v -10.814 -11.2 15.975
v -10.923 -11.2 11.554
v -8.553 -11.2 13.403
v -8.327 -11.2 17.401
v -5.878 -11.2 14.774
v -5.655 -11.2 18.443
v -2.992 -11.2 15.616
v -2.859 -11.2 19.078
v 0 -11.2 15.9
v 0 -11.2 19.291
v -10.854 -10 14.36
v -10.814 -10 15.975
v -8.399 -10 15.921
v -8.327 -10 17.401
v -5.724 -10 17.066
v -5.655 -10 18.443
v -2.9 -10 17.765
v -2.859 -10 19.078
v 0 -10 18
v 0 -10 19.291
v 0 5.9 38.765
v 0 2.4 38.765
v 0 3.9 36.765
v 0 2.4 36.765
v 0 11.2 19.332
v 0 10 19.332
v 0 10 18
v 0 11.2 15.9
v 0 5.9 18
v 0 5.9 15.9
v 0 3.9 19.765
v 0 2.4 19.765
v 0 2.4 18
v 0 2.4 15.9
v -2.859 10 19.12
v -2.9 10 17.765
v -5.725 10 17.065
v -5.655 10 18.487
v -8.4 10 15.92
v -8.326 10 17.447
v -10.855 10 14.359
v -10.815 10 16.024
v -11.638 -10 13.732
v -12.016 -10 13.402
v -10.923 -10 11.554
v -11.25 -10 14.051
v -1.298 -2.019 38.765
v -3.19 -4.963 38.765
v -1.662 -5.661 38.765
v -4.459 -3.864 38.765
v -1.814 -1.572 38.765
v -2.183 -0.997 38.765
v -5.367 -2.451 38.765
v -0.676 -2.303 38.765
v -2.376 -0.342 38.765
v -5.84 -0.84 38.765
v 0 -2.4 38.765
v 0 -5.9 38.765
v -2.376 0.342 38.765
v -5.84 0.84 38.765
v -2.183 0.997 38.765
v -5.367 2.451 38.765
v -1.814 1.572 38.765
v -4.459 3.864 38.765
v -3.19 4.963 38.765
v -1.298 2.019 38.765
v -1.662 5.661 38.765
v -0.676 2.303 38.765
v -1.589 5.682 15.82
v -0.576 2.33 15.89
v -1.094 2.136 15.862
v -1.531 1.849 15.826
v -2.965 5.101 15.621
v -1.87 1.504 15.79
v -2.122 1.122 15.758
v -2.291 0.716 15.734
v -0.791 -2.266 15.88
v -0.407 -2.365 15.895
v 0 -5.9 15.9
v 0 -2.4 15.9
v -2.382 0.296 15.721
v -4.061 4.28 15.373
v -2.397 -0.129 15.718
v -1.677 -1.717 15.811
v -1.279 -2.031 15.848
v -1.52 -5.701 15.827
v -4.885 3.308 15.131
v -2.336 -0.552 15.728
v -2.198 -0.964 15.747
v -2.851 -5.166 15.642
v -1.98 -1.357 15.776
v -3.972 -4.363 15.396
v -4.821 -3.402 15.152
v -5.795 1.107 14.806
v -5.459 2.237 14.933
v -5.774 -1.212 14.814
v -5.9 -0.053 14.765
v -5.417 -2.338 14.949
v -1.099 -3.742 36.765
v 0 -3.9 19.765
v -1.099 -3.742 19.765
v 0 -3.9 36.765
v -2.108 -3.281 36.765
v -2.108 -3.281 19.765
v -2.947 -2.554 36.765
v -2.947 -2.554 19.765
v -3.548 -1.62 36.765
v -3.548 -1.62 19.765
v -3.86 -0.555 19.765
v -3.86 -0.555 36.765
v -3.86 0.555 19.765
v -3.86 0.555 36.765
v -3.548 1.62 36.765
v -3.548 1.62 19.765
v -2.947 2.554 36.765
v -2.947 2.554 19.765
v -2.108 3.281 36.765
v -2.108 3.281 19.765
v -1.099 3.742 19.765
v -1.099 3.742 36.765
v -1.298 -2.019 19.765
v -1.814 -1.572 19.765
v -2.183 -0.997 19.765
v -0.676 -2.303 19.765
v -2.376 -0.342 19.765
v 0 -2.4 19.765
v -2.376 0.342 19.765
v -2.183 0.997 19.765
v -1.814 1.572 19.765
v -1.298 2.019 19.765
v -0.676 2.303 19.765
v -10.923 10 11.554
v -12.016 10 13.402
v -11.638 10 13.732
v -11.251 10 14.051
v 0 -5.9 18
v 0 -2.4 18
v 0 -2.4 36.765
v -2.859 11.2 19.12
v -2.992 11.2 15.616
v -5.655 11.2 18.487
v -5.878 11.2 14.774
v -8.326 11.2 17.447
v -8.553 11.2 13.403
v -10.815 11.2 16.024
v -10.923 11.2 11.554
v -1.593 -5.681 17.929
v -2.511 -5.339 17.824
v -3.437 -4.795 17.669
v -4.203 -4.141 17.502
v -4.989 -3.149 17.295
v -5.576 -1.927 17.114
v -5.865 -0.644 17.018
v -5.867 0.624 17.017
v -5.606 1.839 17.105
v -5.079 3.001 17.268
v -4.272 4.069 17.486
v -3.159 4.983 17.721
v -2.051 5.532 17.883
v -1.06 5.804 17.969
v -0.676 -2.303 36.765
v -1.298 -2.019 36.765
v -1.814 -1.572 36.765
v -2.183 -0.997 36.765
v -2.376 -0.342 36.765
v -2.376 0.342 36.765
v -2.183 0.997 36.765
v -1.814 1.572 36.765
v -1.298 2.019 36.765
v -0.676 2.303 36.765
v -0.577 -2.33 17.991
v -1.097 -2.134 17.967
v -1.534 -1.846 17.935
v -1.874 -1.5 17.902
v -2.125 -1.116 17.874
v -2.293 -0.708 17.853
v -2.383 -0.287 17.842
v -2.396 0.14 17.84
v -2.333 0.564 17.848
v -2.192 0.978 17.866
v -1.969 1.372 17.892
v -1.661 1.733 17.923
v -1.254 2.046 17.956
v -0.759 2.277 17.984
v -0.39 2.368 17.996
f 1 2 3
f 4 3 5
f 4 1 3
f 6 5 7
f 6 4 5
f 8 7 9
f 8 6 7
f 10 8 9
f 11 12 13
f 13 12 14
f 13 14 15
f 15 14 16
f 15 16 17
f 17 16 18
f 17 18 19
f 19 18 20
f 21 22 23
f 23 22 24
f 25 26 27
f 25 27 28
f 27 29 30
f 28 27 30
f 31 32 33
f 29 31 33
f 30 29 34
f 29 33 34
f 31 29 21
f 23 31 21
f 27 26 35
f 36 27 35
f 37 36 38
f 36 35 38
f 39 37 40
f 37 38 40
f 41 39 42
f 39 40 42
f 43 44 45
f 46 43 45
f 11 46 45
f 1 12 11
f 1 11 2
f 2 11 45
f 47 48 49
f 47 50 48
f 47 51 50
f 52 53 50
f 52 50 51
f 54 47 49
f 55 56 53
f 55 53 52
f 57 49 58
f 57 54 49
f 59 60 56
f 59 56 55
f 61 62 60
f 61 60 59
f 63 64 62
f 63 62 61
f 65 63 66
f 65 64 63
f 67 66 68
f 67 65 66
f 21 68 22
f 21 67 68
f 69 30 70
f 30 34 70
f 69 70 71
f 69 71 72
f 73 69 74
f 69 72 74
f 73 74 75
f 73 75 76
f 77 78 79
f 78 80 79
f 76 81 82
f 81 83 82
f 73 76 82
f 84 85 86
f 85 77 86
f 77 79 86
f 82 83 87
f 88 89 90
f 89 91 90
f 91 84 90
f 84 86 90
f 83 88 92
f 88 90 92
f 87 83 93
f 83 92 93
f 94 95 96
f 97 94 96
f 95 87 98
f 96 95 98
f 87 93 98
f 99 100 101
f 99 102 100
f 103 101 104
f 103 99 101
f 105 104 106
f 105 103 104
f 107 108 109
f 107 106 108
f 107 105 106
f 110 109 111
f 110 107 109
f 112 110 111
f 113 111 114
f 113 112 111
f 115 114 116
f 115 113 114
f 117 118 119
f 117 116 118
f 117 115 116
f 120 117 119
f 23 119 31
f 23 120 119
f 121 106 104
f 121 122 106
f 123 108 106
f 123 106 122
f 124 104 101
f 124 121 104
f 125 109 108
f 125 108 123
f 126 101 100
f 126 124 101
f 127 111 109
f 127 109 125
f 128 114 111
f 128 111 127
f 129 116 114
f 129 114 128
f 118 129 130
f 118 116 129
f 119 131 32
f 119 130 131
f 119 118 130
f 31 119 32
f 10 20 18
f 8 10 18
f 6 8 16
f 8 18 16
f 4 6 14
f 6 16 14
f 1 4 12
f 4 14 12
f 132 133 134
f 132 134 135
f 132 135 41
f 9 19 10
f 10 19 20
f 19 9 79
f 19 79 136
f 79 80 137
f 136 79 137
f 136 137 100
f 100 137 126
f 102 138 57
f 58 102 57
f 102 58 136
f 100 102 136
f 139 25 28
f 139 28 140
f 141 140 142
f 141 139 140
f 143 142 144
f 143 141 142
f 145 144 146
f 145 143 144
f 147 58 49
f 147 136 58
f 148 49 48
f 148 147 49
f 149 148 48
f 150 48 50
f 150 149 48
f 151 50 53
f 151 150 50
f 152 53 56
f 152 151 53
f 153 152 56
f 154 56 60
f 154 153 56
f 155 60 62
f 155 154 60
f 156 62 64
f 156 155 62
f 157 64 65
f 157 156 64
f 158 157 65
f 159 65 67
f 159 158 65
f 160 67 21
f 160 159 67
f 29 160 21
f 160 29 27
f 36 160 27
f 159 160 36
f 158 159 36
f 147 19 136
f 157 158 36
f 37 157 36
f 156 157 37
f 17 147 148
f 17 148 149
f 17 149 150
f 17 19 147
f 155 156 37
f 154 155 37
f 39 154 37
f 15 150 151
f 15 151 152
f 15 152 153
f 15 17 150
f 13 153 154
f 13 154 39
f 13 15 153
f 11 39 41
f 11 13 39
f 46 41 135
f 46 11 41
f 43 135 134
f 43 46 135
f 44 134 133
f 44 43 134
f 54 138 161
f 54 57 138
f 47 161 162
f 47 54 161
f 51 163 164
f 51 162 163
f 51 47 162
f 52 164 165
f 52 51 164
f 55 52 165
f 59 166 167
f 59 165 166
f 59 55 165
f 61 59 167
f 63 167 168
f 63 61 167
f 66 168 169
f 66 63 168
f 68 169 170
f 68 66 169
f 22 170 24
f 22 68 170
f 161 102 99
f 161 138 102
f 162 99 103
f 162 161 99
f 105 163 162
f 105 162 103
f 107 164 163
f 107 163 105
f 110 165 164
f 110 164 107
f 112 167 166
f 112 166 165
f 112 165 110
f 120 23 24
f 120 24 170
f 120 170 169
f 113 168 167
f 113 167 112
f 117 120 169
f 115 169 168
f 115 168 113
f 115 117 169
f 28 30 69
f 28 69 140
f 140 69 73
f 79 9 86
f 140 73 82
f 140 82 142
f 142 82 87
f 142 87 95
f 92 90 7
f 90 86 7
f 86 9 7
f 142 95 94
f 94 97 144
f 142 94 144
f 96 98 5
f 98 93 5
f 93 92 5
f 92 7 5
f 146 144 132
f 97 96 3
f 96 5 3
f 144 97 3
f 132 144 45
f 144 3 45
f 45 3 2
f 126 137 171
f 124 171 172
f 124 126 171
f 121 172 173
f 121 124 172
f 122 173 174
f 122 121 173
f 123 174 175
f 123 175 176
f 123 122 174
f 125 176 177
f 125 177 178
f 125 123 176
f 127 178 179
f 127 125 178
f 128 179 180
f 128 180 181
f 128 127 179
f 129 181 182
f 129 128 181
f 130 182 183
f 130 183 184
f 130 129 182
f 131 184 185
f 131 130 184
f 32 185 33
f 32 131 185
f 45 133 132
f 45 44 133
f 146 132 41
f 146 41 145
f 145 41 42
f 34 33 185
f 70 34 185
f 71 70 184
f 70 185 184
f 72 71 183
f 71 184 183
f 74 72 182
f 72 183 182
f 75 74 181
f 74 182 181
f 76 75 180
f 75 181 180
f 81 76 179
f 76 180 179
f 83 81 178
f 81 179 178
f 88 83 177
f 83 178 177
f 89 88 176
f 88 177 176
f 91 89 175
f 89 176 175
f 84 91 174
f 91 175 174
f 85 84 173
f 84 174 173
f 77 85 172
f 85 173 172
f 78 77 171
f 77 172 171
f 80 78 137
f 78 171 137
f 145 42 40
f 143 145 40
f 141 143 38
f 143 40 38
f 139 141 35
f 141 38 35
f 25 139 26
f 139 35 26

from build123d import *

# Parameters (mm, degrees)
F1_ANGLE  = 180
F3_DEPTH  = 10
F4_R      = 15.9
F5_DEPTH  = 12.5
F6_R      = 2.4
F7_DEPTH  = 8.211553
F9_DEPTH  = 1.2
F11_DEPTH = 1.2


with BuildPart() as f1:
    # F0 (on Front) → F1 (revolve, symmetric)
    with BuildSketch(Plane.XZ) as f1_sk:
        Polygon((-5.9, 14.764823), (-2.4, 15.717824), (-2.4, 19.764823), (-3.9, 19.764823), (-3.9, 36.764823), (-2.4, 36.764823), (-2.4, 38.764823), (-5.9, 38.764823), align=None)
    revolve(axis=Axis((0, 0, 26.233703), (0, 0, 1)), revolution_arc=F1_ANGLE / 2)
    revolve(f1_sk.sketch, axis=Axis((0, 0, 26.233703), (0, 0, -1)), revolution_arc=F1_ANGLE / 2)

    # F2 (on Front) → F3 (join, symmetric)
    with BuildSketch(Plane.XZ):
        with BuildLine():
            ThreePointArc((-10.922859, 11.55427), (-5.877802, 14.773674), (0, 15.9))
            Line((0, 15.9), (0, 18))
            ThreePointArc((0, 18), (-6.432893, 16.811243), (-12.016103, 13.401987))
            Line((-12.016103, 13.401987), (-10.922859, 11.55427))
        make_face()
    extrude(amount=F3_DEPTH, both=True)

    # F4 (on Front) → F5 (cut, symmetric)
    with BuildSketch(Plane.XZ):
        Circle(F4_R)
    extrude(amount=F5_DEPTH, both=True, mode=Mode.SUBTRACT)

    # F6 (on face) → F7 (cut, through all)
    with BuildSketch(Plane.XY.offset(19.764823)):
        Circle(F6_R)
    extrude(amount=-F7_DEPTH, mode=Mode.SUBTRACT)

    # F8 (on face) → F9 (join)
    with BuildSketch(Plane.XZ.offset(10)):
        with BuildLine():
            ThreePointArc((-10.922859, 11.55427), (-5.877802, 14.773674), (0, 15.9))
            Line((0, 15.9), (0, 19.290676))
            ThreePointArc((0, 19.290676), (-5.655412, 18.443061), (-10.813836, 15.974703))
            Line((-10.813836, 15.974703), (-10.922859, 11.55427))
        make_face()
    extrude(amount=F9_DEPTH)

    # F10 (on face) → F11 (join)
    with BuildSketch(Plane(origin=(0, 10, 0), x_dir=(-1, 0, 0), z_dir=(0, 1, 0))):
        with BuildLine():
            Line((0, 19.332207), (0, 15.9))
            ThreePointArc((0, 15.9), (5.877802, 14.773674), (10.922859, 11.55427))
            Line((10.922859, 11.55427), (10.814505, 16.024379))
            ThreePointArc((10.814505, 16.024379), (5.654539, 18.486764), (0, 19.332207))
        make_face()
    extrude(amount=F11_DEPTH)


solid = f1.part
